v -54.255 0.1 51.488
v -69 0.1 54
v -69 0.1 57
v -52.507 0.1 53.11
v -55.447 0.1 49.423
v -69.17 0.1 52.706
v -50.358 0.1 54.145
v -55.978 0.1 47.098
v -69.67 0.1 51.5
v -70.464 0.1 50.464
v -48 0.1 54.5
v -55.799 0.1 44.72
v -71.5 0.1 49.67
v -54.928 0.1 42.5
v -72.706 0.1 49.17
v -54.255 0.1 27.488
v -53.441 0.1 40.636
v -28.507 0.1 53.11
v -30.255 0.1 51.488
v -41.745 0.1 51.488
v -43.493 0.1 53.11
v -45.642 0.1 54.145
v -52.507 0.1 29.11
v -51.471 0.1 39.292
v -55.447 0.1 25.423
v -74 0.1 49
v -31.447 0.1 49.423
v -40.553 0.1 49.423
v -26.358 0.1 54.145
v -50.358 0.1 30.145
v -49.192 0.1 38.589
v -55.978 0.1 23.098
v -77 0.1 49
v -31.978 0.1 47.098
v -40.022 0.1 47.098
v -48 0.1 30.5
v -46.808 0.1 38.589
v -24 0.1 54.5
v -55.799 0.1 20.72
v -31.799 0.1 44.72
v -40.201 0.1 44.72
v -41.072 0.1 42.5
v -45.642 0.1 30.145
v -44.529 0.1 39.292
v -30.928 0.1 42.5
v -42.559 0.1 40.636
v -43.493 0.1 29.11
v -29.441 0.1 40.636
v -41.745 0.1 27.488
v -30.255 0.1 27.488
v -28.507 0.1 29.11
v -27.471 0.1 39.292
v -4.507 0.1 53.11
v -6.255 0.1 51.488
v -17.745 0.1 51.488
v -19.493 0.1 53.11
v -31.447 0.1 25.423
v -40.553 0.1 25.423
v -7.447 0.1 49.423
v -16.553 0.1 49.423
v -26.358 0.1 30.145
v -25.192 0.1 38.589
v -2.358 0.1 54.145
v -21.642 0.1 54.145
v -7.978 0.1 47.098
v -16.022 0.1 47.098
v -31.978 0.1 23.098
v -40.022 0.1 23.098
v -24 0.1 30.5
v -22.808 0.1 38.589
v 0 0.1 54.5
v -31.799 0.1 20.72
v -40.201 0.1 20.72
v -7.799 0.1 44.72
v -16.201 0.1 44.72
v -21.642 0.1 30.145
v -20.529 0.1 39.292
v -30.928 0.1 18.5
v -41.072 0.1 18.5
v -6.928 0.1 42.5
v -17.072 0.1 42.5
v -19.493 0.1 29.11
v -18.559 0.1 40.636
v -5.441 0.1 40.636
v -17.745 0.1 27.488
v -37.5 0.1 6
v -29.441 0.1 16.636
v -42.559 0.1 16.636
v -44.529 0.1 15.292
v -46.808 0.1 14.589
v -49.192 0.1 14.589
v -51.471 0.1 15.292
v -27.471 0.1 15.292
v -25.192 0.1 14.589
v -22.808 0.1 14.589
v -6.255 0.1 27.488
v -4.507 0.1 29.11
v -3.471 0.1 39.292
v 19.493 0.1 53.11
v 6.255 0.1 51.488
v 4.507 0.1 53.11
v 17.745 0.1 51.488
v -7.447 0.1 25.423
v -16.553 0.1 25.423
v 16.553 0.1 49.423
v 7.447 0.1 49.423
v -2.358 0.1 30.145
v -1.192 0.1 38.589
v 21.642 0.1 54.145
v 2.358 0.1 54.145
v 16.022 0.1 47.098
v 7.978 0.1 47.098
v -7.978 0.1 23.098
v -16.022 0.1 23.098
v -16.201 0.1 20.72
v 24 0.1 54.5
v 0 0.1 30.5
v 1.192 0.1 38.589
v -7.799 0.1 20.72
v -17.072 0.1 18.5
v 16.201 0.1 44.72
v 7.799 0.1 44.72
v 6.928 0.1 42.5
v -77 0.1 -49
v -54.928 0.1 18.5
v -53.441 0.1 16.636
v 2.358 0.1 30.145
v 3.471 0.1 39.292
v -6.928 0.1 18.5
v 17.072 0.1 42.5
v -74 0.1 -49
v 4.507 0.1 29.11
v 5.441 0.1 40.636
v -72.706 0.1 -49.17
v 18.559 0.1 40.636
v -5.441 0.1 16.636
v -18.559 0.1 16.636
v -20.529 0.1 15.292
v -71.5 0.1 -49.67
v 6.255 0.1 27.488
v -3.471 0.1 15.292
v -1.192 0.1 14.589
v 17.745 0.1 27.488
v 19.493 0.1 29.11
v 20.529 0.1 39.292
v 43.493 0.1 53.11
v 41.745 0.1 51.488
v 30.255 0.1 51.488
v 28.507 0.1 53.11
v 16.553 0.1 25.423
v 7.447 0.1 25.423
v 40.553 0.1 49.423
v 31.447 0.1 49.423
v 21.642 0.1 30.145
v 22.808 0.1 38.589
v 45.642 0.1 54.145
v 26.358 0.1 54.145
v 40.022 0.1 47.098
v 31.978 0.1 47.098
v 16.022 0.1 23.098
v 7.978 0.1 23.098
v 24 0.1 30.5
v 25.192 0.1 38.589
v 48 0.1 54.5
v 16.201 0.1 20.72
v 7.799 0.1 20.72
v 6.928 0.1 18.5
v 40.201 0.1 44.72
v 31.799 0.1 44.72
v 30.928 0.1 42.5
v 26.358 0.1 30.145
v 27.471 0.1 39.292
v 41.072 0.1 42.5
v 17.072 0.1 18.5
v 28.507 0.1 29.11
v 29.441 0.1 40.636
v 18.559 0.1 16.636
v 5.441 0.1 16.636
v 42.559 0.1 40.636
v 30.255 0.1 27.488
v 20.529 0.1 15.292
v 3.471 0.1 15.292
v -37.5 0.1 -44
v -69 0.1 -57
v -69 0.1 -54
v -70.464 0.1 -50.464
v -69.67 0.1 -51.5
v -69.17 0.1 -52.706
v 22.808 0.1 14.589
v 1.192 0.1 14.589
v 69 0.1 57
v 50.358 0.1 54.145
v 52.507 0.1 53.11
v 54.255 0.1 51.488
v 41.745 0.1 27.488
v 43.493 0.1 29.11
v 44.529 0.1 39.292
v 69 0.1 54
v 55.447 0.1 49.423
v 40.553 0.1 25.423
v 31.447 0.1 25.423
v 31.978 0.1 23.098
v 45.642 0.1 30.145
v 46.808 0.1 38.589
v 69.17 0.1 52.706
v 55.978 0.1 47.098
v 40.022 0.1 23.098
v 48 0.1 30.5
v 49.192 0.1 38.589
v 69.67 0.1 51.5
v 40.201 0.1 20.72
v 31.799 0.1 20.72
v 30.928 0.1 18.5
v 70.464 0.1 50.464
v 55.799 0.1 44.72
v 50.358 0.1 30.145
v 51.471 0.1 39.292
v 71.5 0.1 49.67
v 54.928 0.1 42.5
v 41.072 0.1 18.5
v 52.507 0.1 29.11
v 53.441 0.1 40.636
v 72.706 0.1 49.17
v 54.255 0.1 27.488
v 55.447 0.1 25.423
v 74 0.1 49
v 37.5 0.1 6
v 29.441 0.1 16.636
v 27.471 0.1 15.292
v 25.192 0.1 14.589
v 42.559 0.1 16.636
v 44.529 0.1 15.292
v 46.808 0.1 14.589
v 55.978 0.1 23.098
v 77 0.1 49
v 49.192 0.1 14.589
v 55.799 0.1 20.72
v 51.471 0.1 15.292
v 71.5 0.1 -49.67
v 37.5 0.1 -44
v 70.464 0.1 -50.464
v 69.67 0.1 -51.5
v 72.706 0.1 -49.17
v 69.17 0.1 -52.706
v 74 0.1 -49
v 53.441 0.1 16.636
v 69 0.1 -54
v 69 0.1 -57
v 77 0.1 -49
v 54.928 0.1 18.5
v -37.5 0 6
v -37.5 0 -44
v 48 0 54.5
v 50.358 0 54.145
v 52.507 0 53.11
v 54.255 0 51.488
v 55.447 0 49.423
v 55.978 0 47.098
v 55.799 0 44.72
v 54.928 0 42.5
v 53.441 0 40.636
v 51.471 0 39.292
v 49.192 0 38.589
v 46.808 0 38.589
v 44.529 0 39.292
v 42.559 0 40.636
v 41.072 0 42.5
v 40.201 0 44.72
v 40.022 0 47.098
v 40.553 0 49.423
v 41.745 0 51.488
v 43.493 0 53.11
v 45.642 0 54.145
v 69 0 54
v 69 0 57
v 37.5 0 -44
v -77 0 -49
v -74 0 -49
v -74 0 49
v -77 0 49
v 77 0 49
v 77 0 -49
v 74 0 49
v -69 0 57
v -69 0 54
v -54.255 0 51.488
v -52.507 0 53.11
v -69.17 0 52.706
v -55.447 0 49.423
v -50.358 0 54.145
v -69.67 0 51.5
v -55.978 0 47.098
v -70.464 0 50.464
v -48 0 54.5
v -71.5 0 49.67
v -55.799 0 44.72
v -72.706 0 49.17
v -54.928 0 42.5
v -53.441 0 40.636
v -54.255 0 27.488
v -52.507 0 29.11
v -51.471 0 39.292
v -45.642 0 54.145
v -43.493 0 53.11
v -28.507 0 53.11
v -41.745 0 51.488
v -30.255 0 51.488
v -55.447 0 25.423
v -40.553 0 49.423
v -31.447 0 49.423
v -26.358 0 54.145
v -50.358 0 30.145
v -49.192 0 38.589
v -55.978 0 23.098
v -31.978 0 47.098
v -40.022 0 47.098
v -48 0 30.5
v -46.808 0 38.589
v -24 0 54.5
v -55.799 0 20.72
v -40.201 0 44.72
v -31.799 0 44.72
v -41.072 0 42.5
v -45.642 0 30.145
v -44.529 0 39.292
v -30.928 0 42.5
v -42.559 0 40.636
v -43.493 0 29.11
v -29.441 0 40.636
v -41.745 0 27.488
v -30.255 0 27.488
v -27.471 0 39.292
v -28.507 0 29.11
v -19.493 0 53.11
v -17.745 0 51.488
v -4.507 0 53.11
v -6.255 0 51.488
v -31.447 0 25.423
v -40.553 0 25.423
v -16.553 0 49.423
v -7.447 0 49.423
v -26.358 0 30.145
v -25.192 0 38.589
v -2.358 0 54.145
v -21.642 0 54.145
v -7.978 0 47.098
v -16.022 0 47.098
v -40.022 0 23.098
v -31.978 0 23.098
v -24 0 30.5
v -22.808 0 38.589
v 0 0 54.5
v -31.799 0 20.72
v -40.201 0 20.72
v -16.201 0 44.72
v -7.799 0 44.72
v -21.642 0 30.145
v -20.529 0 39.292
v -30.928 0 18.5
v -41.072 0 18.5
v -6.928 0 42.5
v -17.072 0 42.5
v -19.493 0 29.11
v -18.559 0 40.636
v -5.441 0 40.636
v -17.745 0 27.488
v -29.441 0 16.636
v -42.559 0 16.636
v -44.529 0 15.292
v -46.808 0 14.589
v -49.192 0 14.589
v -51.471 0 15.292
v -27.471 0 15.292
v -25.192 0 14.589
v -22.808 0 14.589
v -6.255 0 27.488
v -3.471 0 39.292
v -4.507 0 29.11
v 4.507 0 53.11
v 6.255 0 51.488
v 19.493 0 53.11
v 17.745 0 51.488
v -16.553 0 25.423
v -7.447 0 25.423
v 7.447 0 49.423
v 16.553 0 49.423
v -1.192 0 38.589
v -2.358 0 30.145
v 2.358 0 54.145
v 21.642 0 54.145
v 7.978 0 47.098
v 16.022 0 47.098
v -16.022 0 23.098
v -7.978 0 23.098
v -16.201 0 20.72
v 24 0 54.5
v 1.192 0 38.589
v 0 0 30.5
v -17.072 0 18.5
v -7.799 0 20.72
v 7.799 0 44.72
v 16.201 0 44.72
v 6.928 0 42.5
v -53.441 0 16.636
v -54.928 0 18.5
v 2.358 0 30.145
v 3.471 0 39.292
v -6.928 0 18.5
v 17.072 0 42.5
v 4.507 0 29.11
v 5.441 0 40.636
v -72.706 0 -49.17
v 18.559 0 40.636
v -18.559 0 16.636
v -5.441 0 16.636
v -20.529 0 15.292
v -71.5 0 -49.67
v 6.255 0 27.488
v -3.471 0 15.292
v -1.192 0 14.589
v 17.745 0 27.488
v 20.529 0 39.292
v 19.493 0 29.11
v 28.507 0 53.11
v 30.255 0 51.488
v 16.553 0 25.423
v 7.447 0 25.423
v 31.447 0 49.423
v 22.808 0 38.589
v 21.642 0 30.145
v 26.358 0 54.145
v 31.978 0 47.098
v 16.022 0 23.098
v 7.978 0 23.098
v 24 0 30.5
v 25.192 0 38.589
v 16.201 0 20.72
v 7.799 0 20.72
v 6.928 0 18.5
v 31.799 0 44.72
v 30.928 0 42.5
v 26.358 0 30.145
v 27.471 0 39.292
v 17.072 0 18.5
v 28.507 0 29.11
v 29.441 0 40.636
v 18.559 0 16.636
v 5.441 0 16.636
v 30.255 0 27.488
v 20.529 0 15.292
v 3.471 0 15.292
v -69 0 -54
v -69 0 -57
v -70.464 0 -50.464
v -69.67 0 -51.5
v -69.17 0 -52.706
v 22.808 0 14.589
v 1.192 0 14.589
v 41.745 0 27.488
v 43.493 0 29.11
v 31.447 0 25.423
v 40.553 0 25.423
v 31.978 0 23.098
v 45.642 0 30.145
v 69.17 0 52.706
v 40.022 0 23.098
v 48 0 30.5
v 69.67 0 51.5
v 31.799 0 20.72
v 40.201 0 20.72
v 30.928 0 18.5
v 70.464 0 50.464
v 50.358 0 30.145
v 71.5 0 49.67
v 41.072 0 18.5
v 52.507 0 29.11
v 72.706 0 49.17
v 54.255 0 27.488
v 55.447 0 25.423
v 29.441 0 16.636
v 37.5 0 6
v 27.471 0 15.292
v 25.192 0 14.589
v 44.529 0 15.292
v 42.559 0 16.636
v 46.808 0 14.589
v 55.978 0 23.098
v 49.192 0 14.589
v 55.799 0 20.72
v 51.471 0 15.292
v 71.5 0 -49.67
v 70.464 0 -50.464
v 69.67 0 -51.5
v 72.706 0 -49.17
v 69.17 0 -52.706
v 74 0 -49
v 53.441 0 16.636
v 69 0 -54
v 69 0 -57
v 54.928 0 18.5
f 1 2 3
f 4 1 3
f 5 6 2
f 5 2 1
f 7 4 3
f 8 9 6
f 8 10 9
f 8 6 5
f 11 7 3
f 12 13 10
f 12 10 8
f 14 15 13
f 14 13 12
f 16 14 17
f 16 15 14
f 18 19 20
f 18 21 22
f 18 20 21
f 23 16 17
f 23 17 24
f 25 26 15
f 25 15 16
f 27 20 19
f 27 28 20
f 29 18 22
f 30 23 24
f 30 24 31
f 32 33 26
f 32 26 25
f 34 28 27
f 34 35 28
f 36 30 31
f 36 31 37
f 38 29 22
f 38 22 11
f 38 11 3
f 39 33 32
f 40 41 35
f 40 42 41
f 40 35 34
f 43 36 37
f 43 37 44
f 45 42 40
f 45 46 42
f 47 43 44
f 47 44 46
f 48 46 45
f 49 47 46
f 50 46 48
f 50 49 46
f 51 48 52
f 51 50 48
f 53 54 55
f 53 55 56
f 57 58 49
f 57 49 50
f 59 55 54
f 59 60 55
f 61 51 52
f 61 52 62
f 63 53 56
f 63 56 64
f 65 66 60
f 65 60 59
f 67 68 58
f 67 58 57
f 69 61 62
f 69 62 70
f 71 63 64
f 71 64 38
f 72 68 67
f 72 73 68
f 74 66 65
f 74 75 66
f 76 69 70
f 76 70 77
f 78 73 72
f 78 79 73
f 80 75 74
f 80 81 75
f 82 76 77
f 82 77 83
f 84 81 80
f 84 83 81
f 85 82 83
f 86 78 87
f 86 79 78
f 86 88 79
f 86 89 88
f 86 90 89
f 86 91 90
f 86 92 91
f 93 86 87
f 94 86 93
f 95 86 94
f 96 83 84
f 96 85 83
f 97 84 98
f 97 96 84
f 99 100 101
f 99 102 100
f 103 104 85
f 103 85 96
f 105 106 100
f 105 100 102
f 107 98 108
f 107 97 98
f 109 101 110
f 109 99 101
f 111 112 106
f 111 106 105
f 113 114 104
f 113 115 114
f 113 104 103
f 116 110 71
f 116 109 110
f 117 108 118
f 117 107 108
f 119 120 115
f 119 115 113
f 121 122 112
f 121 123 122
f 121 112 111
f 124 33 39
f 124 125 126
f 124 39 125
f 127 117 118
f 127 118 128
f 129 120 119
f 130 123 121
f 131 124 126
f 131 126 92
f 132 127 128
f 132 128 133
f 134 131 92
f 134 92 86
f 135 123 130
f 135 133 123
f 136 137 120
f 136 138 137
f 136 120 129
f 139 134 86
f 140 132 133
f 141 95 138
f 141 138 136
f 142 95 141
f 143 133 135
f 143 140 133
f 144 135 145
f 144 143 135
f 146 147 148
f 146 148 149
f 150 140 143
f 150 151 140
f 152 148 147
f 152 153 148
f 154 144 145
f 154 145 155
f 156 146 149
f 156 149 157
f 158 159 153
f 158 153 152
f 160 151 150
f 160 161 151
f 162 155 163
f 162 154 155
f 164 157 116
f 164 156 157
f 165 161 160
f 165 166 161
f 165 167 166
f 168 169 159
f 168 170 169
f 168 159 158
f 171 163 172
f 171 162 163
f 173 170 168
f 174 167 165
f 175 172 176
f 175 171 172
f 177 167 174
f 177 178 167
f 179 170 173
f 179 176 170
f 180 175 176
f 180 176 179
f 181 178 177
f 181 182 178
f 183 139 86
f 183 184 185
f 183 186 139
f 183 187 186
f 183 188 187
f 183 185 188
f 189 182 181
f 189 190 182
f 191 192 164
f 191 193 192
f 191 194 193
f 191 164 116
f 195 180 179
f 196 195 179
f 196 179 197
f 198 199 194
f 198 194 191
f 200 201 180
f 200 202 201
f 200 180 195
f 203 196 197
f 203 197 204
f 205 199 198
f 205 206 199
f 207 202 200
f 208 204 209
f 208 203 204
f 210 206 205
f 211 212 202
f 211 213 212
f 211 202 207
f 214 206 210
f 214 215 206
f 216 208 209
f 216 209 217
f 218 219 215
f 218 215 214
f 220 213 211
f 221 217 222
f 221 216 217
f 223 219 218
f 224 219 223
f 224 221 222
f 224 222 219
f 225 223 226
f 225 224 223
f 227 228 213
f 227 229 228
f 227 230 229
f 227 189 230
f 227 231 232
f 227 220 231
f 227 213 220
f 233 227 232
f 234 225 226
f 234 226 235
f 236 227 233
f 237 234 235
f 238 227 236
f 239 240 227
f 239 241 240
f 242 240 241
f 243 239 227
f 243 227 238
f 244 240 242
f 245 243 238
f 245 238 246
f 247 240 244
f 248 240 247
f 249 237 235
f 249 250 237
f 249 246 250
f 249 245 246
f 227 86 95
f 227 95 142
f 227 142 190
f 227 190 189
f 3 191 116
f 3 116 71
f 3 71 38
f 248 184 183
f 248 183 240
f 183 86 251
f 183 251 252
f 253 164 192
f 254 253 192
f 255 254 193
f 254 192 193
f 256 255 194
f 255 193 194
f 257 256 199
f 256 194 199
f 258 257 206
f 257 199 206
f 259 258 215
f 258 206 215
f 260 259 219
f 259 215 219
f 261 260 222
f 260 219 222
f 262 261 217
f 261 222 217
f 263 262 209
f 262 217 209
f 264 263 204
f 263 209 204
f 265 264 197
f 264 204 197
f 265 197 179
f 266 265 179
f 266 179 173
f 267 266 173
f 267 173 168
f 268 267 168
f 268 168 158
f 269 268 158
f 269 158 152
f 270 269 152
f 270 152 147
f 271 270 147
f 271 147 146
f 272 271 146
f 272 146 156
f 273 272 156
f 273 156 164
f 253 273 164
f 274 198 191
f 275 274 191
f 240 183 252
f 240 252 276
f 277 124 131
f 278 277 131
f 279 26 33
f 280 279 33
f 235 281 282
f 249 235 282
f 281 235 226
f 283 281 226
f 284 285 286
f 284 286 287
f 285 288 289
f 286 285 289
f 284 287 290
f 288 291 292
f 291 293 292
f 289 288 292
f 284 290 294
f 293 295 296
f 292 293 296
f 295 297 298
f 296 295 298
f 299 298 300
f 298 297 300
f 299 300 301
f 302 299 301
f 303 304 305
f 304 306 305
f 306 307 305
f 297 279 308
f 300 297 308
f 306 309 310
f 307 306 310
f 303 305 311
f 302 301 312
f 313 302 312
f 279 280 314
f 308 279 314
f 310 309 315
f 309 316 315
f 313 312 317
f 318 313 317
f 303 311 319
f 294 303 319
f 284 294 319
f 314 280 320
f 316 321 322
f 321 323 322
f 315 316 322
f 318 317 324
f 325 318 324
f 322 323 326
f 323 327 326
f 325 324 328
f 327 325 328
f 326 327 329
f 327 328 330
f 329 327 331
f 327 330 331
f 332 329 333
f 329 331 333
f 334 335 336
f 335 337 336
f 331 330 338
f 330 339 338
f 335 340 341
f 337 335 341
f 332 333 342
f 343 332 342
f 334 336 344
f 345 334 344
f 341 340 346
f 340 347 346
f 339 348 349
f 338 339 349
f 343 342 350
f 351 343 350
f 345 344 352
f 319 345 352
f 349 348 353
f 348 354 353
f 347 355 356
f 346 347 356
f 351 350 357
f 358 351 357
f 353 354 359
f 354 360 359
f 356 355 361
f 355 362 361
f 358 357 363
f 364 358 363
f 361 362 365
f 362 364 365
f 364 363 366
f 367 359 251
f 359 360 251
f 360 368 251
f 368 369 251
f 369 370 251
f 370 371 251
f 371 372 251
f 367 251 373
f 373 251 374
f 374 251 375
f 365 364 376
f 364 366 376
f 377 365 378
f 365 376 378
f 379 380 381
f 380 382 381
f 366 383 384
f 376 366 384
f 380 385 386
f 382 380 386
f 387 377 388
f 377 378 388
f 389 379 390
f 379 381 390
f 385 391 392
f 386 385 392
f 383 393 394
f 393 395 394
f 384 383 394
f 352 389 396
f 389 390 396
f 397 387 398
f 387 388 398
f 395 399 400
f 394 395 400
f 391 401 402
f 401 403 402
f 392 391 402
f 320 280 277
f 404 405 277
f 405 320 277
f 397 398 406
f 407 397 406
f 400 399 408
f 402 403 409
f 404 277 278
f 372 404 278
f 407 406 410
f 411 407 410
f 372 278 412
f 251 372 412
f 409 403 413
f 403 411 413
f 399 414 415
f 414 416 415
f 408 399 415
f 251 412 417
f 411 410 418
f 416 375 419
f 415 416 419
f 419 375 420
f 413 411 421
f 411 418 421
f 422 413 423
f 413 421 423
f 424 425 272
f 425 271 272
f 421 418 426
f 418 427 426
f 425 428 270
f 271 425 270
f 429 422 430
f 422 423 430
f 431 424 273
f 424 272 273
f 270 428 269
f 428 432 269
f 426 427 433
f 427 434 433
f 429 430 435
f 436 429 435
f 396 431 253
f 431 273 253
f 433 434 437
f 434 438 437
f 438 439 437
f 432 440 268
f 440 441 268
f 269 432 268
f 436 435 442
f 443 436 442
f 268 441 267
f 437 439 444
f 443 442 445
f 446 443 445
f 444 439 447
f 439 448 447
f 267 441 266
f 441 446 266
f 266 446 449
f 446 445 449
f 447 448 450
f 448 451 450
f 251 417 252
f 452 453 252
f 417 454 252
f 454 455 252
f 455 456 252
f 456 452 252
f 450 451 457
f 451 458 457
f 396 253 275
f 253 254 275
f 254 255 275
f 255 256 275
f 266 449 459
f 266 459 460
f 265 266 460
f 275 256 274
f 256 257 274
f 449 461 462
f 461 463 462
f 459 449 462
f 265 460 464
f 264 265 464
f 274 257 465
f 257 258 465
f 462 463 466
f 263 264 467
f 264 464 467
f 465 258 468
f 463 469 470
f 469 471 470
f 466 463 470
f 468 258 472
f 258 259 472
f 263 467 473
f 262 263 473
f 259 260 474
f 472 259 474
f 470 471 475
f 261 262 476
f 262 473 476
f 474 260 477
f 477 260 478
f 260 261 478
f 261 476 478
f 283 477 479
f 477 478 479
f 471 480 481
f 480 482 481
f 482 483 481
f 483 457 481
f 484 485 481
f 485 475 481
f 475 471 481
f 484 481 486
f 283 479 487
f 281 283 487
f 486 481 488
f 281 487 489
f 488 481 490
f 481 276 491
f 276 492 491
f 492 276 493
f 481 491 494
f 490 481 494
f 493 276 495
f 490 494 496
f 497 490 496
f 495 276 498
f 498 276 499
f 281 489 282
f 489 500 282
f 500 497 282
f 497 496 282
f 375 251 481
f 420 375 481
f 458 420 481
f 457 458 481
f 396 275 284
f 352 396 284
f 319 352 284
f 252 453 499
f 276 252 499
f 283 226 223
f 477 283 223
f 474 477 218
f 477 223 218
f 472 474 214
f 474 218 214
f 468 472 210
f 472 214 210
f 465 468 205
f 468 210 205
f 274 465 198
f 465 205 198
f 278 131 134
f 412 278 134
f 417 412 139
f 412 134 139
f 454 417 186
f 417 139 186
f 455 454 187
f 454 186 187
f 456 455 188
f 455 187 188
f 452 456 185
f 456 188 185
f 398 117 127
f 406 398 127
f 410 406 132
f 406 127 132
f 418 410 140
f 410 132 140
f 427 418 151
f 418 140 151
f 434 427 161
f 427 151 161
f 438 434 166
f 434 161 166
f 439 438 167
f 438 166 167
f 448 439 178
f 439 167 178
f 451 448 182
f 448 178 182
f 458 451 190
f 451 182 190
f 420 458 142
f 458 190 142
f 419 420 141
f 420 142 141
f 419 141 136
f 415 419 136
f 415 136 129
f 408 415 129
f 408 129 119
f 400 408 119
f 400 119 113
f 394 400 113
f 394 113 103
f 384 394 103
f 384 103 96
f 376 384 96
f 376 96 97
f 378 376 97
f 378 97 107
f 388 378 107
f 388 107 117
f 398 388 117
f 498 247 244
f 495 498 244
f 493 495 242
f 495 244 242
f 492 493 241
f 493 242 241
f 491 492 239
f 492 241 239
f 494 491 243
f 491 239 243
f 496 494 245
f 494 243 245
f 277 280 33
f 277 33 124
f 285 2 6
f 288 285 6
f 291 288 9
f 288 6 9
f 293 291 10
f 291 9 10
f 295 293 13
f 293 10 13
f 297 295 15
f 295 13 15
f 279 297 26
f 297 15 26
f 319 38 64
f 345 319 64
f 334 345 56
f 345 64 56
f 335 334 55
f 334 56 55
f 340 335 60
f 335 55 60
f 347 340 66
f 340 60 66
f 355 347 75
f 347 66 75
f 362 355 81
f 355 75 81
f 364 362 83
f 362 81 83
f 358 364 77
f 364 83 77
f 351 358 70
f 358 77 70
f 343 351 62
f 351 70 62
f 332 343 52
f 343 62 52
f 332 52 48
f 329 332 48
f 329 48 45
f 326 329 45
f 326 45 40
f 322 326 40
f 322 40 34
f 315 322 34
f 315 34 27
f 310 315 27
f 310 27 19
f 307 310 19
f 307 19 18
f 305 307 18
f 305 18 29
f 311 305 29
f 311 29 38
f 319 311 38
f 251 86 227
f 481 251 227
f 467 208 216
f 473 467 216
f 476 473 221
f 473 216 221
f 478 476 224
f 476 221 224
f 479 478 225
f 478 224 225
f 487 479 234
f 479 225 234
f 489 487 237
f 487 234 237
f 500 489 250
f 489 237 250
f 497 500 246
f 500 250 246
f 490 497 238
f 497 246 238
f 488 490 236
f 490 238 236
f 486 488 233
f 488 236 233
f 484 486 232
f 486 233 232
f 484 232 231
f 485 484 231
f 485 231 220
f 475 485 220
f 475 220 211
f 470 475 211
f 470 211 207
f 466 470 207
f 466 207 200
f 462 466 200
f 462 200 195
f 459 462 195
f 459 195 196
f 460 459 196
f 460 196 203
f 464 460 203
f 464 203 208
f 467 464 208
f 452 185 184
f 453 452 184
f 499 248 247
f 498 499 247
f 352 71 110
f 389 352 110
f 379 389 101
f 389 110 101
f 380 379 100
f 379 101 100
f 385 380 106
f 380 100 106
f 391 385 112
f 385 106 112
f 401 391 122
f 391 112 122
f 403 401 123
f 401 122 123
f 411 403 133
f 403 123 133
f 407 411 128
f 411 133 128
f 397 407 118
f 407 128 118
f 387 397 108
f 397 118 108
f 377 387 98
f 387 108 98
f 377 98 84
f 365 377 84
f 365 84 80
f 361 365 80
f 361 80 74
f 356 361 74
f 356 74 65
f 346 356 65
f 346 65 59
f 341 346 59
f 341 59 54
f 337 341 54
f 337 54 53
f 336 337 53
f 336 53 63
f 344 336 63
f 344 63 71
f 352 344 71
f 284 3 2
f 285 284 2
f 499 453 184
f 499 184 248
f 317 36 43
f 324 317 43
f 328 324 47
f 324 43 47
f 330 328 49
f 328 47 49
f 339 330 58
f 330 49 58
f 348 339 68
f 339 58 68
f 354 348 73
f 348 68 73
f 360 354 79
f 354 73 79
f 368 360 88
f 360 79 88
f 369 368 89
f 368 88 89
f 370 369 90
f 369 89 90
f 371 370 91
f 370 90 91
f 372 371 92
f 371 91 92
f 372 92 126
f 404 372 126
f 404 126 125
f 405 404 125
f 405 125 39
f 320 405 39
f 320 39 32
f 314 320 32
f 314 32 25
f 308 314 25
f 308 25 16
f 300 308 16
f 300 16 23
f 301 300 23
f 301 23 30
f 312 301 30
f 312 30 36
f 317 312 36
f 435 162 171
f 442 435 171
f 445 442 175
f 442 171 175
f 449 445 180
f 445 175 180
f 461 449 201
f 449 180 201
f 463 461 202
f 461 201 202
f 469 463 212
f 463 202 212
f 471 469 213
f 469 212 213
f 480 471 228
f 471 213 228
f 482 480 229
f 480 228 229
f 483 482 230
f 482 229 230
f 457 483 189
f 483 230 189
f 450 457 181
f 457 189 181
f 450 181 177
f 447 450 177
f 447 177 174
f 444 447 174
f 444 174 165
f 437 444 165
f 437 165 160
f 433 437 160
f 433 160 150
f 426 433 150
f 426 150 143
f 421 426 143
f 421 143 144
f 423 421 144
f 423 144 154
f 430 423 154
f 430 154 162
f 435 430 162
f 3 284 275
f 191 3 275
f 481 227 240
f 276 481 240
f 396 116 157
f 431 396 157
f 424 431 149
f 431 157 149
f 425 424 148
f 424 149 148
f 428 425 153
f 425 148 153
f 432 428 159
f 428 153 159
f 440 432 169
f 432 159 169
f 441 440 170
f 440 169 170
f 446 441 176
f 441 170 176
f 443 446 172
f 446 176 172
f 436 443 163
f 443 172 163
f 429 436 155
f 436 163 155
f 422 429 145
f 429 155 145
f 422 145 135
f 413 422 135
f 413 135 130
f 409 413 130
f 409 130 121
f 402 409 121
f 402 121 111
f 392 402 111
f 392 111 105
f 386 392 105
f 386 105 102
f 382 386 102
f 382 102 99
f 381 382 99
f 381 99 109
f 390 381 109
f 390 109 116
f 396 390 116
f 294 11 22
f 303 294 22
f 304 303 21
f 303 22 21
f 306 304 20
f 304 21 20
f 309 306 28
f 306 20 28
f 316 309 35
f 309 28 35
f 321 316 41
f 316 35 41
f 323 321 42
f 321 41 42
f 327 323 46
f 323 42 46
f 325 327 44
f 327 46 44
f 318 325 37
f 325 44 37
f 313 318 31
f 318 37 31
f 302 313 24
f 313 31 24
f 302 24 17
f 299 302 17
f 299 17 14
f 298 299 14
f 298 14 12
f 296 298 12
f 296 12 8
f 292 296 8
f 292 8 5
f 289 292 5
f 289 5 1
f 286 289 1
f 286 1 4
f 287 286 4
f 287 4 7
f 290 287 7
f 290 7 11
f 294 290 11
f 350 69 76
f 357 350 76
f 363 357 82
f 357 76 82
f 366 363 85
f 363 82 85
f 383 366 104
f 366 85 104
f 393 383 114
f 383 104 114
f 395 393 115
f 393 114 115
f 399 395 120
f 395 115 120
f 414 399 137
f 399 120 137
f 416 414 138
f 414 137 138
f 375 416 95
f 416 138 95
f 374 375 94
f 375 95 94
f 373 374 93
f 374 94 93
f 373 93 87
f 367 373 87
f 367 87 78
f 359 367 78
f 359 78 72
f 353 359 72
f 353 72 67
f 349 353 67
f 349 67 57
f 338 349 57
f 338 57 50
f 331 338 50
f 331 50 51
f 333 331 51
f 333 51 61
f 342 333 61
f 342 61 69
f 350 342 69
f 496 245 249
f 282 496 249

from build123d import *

# Parameters (mm, degrees)
SKETCH1_W           = 154
SKETCH1_H           = 114
BOSS_EXTRUDE1_DEPTH = 0.1
CUT_EXTRUDE1_DEPTH  = 3
SKETCH3_R           = 8
SKETCH3_W           = 75
SKETCH3_H           = 50
CUT_EXTRUDE2_DEPTH  = 1


with BuildPart() as part:
    # Sketch1 → Boss-Extrude1 (new body)
    with BuildSketch(Plane(origin=(0, 0, 0), x_dir=(1, 0, 0), z_dir=(0, 1, 0))):
        Rectangle(SKETCH1_W, SKETCH1_H)
    extrude(amount=BOSS_EXTRUDE1_DEPTH)

    # Sketch2 → Cut-Extrude1 (cut)
    with BuildSketch(Plane(origin=(0, 0.1, 0), x_dir=(1, 0, 0), z_dir=(0, 1, 0))):
        with BuildLine():
            Line((-52.05, -19.483379374), (-52.05, -25.516620626))
            ThreePointArc((-52.05, -25.516620626), (-48, -27.55), (-43.95, -25.516620626))
            Line((-43.95, -25.516620626), (-43.95, -19.483379374))
            ThreePointArc((-43.95, -19.483379374), (-48, -17.45), (-52.05, -19.483379374))
        make_face()
        with BuildLine():
            Line((-19.95, -19.483379374), (-19.95, -25.516620626))
            ThreePointArc((-19.95, -25.516620626), (-24, -27.55), (-28.05, -25.516620626))
            Line((-28.05, -25.516620626), (-28.05, -19.483379374))
            ThreePointArc((-28.05, -19.483379374), (-24, -17.45), (-19.95, -19.483379374))
        make_face()
        with BuildLine():
            Line((4.05, -19.483379374), (4.05, -25.516620626))
            ThreePointArc((4.05, -25.516620626), (0, -27.55), (-4.05, -25.516620626))
            Line((-4.05, -25.516620626), (-4.05, -19.483379374))
            ThreePointArc((-4.05, -19.483379374), (0, -17.45), (4.05, -19.483379374))
        make_face()
        with BuildLine():
            Line((28.05, -19.483379374), (28.05, -25.516620626))
            ThreePointArc((28.05, -25.516620626), (24, -27.55), (19.95, -25.516620626))
            Line((19.95, -25.516620626), (19.95, -19.483379374))
            ThreePointArc((19.95, -19.483379374), (24, -17.45), (28.05, -19.483379374))
        make_face()
        with BuildLine():
            Line((52.05, -19.483379374), (52.05, -25.516620626))
            ThreePointArc((52.05, -25.516620626), (48, -27.55), (43.95, -25.516620626))
            Line((43.95, -25.516620626), (43.95, -19.483379374))
            ThreePointArc((43.95, -19.483379374), (48, -17.45), (52.05, -19.483379374))
        make_face()
        with BuildLine():
            Line((-19.95, -43.483379374), (-19.95, -49.516620626))
            ThreePointArc((-19.95, -49.516620626), (-24, -51.55), (-28.05, -49.516620626))
            Line((-28.05, -49.516620626), (-28.05, -43.483379374))
            ThreePointArc((-28.05, -43.483379374), (-24, -41.45), (-19.95, -43.483379374))
        make_face()
        with BuildLine():
            Line((4.05, -43.483379374), (4.05, -49.516620626))
            ThreePointArc((4.05, -49.516620626), (0, -51.55), (-4.05, -49.516620626))
            Line((-4.05, -49.516620626), (-4.05, -43.483379374))
            ThreePointArc((-4.05, -43.483379374), (0, -41.45), (4.05, -43.483379374))
        make_face()
        with BuildLine():
            Line((28.05, -43.483379374), (28.05, -49.516620626))
            ThreePointArc((28.05, -49.516620626), (24, -51.55), (19.95, -49.516620626))
            Line((19.95, -49.516620626), (19.95, -43.483379374))
            ThreePointArc((19.95, -43.483379374), (24, -41.45), (28.05, -43.483379374))
        make_face()
        with BuildLine():
            Line((52.05, -43.483379374), (52.05, -49.516620626))
            ThreePointArc((52.05, -49.516620626), (48, -51.55), (43.95, -49.516620626))
            Line((43.95, -49.516620626), (43.95, -43.483379374))
            ThreePointArc((43.95, -43.483379374), (48, -41.45), (52.05, -43.483379374))
        make_face()
        with BuildLine():
            Line((-43.95, -43.483379374), (-43.95, -49.516620626))
            ThreePointArc((-43.95, -49.516620626), (-48, -51.55), (-52.05, -49.516620626))
            Line((-52.05, -49.516620626), (-52.05, -43.483379374))
            ThreePointArc((-52.05, -43.483379374), (-48, -41.45), (-43.95, -43.483379374))
        make_face()
    extrude(amount=-CUT_EXTRUDE1_DEPTH, mode=Mode.SUBTRACT)

    # Sketch3 → Cut-Extrude2 (cut)
    # profile 1 of 15: a face of its own
    with BuildSketch(Plane(origin=(0, 0.1, 0), x_dir=(1, 0, 0), z_dir=(0, 1, 0))):
        with BuildLine():
            Line((-69, 57), (-77, 57))
            Line((-77, 57), (-77, 49))
            Line((-77, 49), (-74, 49))
            ThreePointArc((-74, 49), (-70.464466094, 50.464466094), (-69, 54))
            Line((-69, 54), (-69, 57))
        make_face()
    # profile 2 of 15: a face of its own
    with BuildSketch(Plane(origin=(0, 0.1, 0), x_dir=(1, 0, 0), z_dir=(0, 1, 0))):
        with BuildLine():
            Line((77, 57), (69, 57))
            Line((69, 57), (69, 54))
            ThreePointArc((69, 54), (70.464466094, 50.464466094), (74, 49))
            Line((74, 49), (77, 49))
            Line((77, 49), (77, 57))
        make_face()
    # profile 3 of 15: a face of its own
    with BuildSketch(Plane(origin=(0, 0.1, 0), x_dir=(1, 0, 0), z_dir=(0, 1, 0))):
        with BuildLine():
            Line((77, -57), (77, -49))
            Line((77, -49), (74, -49))
            ThreePointArc((74, -49), (70.464466094, -50.464466094), (69, -54))
            Line((69, -54), (69, -57))
            Line((69, -57), (77, -57))
        make_face()
    # profile 4 of 15: a face of its own
    with BuildSketch(Plane(origin=(0, 0.1, 0), x_dir=(1, 0, 0), z_dir=(0, 1, 0))):
        with BuildLine():
            Line((-74, -49), (-77, -49))
            Line((-77, -49), (-77, -57))
            Line((-77, -57), (-69, -57))
            Line((-69, -57), (-69, -54))
            ThreePointArc((-69, -54), (-70.464466094, -50.464466094), (-74, -49))
        make_face()
    # profile 5 of 15: a face of its own
    with BuildSketch(Plane(origin=(0, 0.1, 0), x_dir=(1, 0, 0), z_dir=(0, 1, 0))):
        with Locations(Location((-48, -22.5, 0), (0, 0, 270))):
            Circle(SKETCH3_R)
        with BuildLine():
            Line((-52.05, -25.516620626), (-52.05, -19.483379374))
            ThreePointArc((-52.05, -19.483379374), (-48, -17.45), (-43.95, -19.483379374))
            Line((-43.95, -19.483379374), (-43.95, -25.516620626))
            ThreePointArc((-43.95, -25.516620626), (-48, -27.55), (-52.05, -25.516620626))
        make_face(mode=Mode.SUBTRACT)
    # profile 6 of 15: a face of its own
    with BuildSketch(Plane(origin=(0, 0.1, 0), x_dir=(1, 0, 0), z_dir=(0, 1, 0))):
        with Locations(Location((-24, -22.5, 0), (0, 0, 270))):
            Circle(SKETCH3_R)
        with BuildLine():
            Line((-28.05, -25.516620626), (-28.05, -19.483379374))
            ThreePointArc((-28.05, -19.483379374), (-24, -17.45), (-19.95, -19.483379374))
            Line((-19.95, -19.483379374), (-19.95, -25.516620626))
            ThreePointArc((-19.95, -25.516620626), (-24, -27.55), (-28.05, -25.516620626))
        make_face(mode=Mode.SUBTRACT)
    # profile 7 of 15: a face of its own
    with BuildSketch(Plane(origin=(0, 0.1, 0), x_dir=(1, 0, 0), z_dir=(0, 1, 0))):
        with Locations(Location((0, -22.5, 0), (0, 0, 270))):
            Circle(SKETCH3_R)
        with BuildLine():
            Line((-4.05, -25.516620626), (-4.05, -19.483379374))
            ThreePointArc((-4.05, -19.483379374), (0, -17.45), (4.05, -19.483379374))
            Line((4.05, -19.483379374), (4.05, -25.516620626))
            ThreePointArc((4.05, -25.516620626), (0, -27.55), (-4.05, -25.516620626))
        make_face(mode=Mode.SUBTRACT)
    # profile 8 of 15: a face of its own
    with BuildSketch(Plane(origin=(0, 0.1, 0), x_dir=(1, 0, 0), z_dir=(0, 1, 0))):
        with Locations(Location((24, -22.5, 0), (0, 0, 270))):
            Circle(SKETCH3_R)
        with BuildLine():
            Line((19.95, -25.516620626), (19.95, -19.483379374))
            ThreePointArc((19.95, -19.483379374), (24, -17.45), (28.05, -19.483379374))
            Line((28.05, -19.483379374), (28.05, -25.516620626))
            ThreePointArc((28.05, -25.516620626), (24, -27.55), (19.95, -25.516620626))
        make_face(mode=Mode.SUBTRACT)
    # profile 9 of 15: a face of its own
    with BuildSketch(Plane(origin=(0, 0.1, 0), x_dir=(1, 0, 0), z_dir=(0, 1, 0))):
        with Locations(Location((48, -22.5, 0), (0, 0, 270))):
            Circle(SKETCH3_R)
        with BuildLine():
            Line((43.95, -25.516620626), (43.95, -19.483379374))
            ThreePointArc((43.95, -19.483379374), (48, -17.45), (52.05, -19.483379374))
            Line((52.05, -19.483379374), (52.05, -25.516620626))
            ThreePointArc((52.05, -25.516620626), (48, -27.55), (43.95, -25.516620626))
        make_face(mode=Mode.SUBTRACT)
    # profile 10 of 15: a face of its own
    with BuildSketch(Plane(origin=(0, 0.1, 0), x_dir=(1, 0, 0), z_dir=(0, 1, 0))):
        with Locations(Location((48, -46.5, 0), (0, 0, 270))):
            Circle(SKETCH3_R)
        with BuildLine():
            Line((43.95, -49.516620626), (43.95, -43.483379374))
            ThreePointArc((43.95, -43.483379374), (48, -41.45), (52.05, -43.483379374))
            Line((52.05, -43.483379374), (52.05, -49.516620626))
            ThreePointArc((52.05, -49.516620626), (48, -51.55), (43.95, -49.516620626))
        make_face(mode=Mode.SUBTRACT)
    # profile 11 of 15: a face of its own
    with BuildSketch(Plane(origin=(0, 0.1, 0), x_dir=(1, 0, 0), z_dir=(0, 1, 0))):
        with Locations(Location((24, -46.5, 0), (0, 0, 270))):
            Circle(SKETCH3_R)
        with BuildLine():
            Line((19.95, -49.516620626), (19.95, -43.483379374))
            ThreePointArc((19.95, -43.483379374), (24, -41.45), (28.05, -43.483379374))
            Line((28.05, -43.483379374), (28.05, -49.516620626))
            ThreePointArc((28.05, -49.516620626), (24, -51.55), (19.95, -49.516620626))
        make_face(mode=Mode.SUBTRACT)
    # profile 12 of 15: a face of its own
    with BuildSketch(Plane(origin=(0, 0.1, 0), x_dir=(1, 0, 0), z_dir=(0, 1, 0))):
        with Locations(Location((0, -46.5, 0), (0, 0, 270))):
            Circle(SKETCH3_R)
        with BuildLine():
            Line((-4.05, -49.516620626), (-4.05, -43.483379374))
            ThreePointArc((-4.05, -43.483379374), (0, -41.45), (4.05, -43.483379374))
            Line((4.05, -43.483379374), (4.05, -49.516620626))
            ThreePointArc((4.05, -49.516620626), (0, -51.55), (-4.05, -49.516620626))
        make_face(mode=Mode.SUBTRACT)
    # profile 13 of 15: a face of its own
    with BuildSketch(Plane(origin=(0, 0.1, 0), x_dir=(1, 0, 0), z_dir=(0, 1, 0))):
        with Locations(Location((-24, -46.5, 0), (0, 0, 270))):
            Circle(SKETCH3_R)
        with BuildLine():
            Line((-28.05, -49.516620626), (-28.05, -43.483379374))
            ThreePointArc((-28.05, -43.483379374), (-24, -41.45), (-19.95, -43.483379374))
            Line((-19.95, -43.483379374), (-19.95, -49.516620626))
            ThreePointArc((-19.95, -49.516620626), (-24, -51.55), (-28.05, -49.516620626))
        make_face(mode=Mode.SUBTRACT)
    # profile 14 of 15: a face of its own
    with BuildSketch(Plane(origin=(0, 0.1, 0), x_dir=(1, 0, 0), z_dir=(0, 1, 0))):
        with Locations(Location((-48, -46.5, 0), (0, 0, 270))):
            Circle(SKETCH3_R)
        with BuildLine():
            Line((-52.05, -49.516620626), (-52.05, -43.483379374))
            ThreePointArc((-52.05, -43.483379374), (-48, -41.45), (-43.95, -43.483379374))
            Line((-43.95, -43.483379374), (-43.95, -49.516620626))
            ThreePointArc((-43.95, -49.516620626), (-48, -51.55), (-52.05, -49.516620626))
        make_face(mode=Mode.SUBTRACT)
    # profile 15 of 15: a face of its own
    with BuildSketch(Plane(origin=(0, 0.1, 0), x_dir=(1, 0, 0), z_dir=(0, 1, 0))):
        with Locations((0, 19)):
            Rectangle(SKETCH3_W, SKETCH3_H)
    extrude(amount=-CUT_EXTRUDE2_DEPTH, mode=Mode.SUBTRACT)


solid = part.part
